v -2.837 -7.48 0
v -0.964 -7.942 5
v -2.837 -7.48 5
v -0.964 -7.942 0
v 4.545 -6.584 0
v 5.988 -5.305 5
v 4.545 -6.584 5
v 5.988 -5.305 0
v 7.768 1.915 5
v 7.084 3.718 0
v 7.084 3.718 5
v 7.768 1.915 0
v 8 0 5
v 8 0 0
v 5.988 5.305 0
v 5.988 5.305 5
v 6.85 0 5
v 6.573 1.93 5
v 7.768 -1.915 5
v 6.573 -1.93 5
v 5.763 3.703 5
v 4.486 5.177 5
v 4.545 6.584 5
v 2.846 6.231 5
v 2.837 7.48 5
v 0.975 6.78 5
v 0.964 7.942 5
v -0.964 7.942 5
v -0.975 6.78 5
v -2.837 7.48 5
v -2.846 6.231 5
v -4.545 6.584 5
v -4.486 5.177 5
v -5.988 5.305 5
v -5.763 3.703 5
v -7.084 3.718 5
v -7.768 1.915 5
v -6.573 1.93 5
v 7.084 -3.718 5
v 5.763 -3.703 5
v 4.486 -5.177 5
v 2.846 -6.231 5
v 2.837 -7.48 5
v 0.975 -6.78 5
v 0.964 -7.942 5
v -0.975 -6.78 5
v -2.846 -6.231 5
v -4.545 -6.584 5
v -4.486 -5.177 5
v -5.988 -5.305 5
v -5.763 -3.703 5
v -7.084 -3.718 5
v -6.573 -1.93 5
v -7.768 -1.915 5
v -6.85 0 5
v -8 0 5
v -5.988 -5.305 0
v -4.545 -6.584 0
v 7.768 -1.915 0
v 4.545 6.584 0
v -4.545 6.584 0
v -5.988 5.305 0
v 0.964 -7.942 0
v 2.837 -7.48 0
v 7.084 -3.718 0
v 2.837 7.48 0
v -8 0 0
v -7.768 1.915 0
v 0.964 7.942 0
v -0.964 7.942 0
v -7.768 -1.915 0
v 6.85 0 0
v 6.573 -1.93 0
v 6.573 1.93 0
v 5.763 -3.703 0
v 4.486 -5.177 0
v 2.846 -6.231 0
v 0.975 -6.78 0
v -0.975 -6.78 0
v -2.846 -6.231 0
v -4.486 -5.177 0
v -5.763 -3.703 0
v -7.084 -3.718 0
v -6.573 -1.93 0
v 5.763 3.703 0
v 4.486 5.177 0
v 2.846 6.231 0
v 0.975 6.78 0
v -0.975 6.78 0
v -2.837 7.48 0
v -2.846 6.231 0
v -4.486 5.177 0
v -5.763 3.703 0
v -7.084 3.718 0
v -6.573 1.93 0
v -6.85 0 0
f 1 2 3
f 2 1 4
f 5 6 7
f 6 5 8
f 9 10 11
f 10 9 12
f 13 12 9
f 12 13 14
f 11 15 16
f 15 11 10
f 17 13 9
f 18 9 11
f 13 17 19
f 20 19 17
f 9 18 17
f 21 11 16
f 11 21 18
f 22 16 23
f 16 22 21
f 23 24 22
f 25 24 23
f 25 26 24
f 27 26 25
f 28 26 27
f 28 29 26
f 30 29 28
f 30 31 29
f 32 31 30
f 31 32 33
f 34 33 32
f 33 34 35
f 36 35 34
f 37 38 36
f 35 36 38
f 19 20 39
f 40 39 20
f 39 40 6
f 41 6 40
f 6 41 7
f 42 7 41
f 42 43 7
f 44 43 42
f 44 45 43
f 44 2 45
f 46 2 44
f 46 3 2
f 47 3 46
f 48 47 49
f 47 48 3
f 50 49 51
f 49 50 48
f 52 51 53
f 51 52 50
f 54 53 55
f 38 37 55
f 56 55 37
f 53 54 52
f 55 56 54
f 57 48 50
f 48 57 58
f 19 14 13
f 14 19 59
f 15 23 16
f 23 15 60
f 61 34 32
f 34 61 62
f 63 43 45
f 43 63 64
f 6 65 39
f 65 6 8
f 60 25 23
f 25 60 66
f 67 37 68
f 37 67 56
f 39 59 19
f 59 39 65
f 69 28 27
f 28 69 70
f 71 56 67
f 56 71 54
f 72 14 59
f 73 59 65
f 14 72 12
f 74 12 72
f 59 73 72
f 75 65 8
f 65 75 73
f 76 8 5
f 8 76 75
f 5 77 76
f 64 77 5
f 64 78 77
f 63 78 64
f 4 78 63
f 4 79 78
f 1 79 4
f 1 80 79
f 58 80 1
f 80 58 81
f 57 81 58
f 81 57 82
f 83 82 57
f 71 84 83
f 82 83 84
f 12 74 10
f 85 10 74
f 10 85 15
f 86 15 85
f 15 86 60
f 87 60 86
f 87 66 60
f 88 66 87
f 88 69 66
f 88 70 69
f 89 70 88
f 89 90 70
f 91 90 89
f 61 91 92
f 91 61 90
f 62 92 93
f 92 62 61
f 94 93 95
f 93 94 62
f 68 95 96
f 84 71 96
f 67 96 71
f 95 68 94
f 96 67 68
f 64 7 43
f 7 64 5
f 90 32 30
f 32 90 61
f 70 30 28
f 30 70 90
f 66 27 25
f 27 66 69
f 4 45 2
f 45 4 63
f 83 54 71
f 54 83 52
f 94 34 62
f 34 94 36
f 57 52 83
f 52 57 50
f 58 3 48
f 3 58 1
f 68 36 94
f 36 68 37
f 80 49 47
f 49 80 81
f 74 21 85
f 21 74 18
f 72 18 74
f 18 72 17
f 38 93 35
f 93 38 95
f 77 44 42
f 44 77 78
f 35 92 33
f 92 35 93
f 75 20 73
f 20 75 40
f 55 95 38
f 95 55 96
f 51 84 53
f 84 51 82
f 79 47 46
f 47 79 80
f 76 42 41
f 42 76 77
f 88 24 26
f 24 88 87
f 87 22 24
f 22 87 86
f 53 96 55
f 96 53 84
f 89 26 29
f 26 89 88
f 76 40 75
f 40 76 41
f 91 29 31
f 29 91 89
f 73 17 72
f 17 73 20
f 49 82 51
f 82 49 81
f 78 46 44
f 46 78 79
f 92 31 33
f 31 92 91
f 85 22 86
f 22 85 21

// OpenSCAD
difference() {
cylinder(5,16/2,16/2);
cylinder(5,13.7/2,13.7/2);
//13.7
}
